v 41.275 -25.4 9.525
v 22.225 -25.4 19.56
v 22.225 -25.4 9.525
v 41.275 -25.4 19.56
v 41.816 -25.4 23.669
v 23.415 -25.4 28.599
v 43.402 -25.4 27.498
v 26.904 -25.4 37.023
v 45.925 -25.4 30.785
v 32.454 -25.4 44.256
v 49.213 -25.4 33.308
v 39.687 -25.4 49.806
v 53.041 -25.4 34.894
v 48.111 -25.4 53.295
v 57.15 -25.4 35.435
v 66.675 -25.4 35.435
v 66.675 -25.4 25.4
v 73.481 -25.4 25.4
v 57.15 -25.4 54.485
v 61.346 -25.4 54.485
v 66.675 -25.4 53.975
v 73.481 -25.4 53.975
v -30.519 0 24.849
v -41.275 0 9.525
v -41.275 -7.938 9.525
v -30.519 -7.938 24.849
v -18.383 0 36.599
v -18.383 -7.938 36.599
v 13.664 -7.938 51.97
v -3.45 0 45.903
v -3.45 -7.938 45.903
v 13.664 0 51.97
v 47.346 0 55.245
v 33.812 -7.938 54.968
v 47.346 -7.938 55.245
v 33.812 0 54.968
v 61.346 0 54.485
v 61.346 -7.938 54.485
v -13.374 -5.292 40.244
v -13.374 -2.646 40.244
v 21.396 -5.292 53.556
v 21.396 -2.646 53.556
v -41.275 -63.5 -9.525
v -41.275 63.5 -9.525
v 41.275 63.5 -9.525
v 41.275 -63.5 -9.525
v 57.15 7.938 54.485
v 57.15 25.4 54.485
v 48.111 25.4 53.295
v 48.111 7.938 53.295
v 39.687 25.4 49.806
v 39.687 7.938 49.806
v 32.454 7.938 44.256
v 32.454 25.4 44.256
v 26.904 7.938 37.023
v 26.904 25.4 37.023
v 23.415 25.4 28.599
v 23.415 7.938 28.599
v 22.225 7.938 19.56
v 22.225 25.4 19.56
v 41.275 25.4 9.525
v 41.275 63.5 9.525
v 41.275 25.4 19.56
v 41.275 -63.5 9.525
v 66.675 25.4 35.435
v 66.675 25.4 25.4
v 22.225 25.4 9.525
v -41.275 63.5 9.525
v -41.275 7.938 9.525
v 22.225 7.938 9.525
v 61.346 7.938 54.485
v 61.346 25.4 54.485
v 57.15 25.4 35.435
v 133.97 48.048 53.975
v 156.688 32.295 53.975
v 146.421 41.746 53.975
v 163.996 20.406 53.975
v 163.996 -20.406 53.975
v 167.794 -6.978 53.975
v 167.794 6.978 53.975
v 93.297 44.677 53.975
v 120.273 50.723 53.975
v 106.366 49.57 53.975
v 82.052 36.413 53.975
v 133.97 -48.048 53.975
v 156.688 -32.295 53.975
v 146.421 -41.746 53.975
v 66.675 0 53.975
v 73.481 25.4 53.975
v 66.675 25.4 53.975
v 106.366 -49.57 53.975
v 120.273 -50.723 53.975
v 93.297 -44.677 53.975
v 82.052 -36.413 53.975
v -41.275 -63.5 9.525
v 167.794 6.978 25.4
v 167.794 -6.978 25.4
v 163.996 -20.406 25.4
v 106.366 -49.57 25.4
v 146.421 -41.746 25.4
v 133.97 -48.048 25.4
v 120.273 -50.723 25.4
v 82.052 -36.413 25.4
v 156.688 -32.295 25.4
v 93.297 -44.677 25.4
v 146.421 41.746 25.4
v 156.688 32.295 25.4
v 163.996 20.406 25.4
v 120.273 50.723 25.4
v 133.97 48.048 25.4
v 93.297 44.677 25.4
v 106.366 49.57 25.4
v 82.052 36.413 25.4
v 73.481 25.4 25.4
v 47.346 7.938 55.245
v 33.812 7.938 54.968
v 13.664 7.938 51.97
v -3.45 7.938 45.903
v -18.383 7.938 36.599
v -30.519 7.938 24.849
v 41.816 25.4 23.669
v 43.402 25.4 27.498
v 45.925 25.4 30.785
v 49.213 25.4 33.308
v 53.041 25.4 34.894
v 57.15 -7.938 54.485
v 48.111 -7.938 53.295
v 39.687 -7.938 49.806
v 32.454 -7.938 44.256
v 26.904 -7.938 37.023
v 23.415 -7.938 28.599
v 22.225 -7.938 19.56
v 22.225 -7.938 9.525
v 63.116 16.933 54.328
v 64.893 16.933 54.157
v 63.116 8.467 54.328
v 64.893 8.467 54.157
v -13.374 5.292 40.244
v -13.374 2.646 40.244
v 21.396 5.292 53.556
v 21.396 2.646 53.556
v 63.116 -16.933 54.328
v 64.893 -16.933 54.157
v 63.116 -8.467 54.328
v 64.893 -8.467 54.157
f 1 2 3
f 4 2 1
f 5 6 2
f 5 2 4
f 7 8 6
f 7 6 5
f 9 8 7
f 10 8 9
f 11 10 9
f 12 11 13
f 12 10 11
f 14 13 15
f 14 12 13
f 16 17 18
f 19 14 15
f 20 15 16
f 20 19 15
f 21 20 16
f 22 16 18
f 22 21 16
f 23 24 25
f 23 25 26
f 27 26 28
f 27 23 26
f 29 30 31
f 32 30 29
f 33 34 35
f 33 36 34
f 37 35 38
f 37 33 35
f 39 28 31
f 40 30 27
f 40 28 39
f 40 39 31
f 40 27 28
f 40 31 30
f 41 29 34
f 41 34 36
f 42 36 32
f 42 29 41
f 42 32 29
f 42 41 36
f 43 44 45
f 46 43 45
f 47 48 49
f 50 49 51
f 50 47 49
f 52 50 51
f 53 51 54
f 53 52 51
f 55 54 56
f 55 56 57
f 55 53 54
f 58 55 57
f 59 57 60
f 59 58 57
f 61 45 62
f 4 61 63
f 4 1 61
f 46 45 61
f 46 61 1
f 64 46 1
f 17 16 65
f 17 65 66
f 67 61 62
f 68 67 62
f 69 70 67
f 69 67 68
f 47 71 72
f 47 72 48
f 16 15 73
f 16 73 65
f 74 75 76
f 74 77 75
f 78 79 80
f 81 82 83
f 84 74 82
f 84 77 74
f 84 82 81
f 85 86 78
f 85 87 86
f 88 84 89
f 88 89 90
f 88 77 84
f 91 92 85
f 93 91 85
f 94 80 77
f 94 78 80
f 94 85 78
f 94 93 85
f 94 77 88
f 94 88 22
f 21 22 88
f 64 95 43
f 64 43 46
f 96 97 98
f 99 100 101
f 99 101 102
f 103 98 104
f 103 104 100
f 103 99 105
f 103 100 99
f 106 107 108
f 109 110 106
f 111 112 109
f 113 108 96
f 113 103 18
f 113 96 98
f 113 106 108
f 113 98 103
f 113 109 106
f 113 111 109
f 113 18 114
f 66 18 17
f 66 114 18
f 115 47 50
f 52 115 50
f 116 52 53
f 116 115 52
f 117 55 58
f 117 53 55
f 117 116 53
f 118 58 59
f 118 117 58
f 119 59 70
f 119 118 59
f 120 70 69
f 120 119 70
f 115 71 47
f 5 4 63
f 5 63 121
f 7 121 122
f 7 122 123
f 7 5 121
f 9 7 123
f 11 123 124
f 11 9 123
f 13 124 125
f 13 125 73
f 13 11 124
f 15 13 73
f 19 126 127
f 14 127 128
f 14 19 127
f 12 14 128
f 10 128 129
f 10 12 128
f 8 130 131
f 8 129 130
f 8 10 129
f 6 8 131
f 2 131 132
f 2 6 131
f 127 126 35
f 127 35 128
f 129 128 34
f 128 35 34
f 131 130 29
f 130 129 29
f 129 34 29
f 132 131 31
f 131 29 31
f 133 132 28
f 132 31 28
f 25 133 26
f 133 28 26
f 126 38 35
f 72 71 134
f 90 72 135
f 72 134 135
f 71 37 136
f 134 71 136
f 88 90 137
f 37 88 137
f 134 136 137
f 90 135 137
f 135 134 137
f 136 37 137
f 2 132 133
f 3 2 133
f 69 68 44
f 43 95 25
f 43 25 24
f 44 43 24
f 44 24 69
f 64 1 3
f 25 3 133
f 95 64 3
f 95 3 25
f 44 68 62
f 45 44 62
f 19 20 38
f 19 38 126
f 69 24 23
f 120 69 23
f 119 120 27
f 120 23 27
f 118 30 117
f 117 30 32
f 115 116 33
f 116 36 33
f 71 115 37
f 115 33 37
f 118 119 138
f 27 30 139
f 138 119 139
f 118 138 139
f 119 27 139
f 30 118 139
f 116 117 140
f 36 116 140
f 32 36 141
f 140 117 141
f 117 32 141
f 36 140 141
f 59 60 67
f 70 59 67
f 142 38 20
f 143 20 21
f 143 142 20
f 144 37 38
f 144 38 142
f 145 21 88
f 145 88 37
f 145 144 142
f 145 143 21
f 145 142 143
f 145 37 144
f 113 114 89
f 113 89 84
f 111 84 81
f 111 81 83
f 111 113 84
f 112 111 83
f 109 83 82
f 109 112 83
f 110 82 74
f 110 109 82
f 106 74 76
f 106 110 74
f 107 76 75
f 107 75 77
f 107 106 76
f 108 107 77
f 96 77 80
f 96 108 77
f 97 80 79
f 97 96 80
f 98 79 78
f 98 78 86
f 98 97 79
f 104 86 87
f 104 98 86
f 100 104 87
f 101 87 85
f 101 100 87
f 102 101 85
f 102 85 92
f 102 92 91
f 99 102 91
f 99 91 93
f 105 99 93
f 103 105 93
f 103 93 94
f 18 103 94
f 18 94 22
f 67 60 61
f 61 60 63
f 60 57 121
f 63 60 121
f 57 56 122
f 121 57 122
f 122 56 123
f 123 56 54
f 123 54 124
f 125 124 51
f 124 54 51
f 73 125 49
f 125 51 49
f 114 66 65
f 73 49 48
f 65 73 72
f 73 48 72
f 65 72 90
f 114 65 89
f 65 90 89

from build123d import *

# Parameters (mm, degrees)
F1_DEPTH = 63.5
F2_DEPTH = 7.9375
F3_DEPTH = 25.4


with BuildPart() as f1:
    # F0 (on Front) → F1 (new body, symmetric)
    with BuildSketch(Plane.XZ):
        Polygon((22.225, 9.525), (-41.275, 9.525), (-41.275, -9.525), (41.275, -9.525), (41.275, 9.525), align=None)
    extrude(amount=F1_DEPTH, both=True)

    # F0 (on Front) → F2 (join, symmetric)
    with BuildSketch(Plane.XZ):
        with BuildLine():
            add(Edge.make_bspline(
                [(-41.275, 9.525), (-17.372467, 50.623456), (19.370141, 58.072404), (61.345564, 54.485139)],
                knots=[0, 0, 0, 0, 112.026415, 112.026415, 112.026415, 112.026415], degree=3))
            Line((-41.275, 9.525), (22.225, 9.525))
            Line((22.225, 9.525), (22.225, 19.560138))
            ThreePointArc((22.225, 19.560138), (32.454295, 44.255843), (57.15, 54.485139))
            Line((57.15, 54.485139), (61.345564, 54.485139))
        make_face()
    extrude(amount=F2_DEPTH, both=True)

    # F0 (on Front) → F3 (join, symmetric)
    with BuildSketch(Plane.XZ):
        with BuildLine():
            Line((22.225, 19.560138), (22.225, 9.525))
            Line((22.225, 9.525), (41.275, 9.525))
            Line((41.275, 9.525), (41.275, 19.560138))
            ThreePointArc((41.275, 19.560138), (45.92468, 30.785458), (57.15, 35.435138))
            Line((57.15, 35.435138), (66.675, 35.435138))
            Line((66.675, 35.435138), (66.675, 53.975))
            add(Edge.make_bspline(
                [(61.345564, 54.485139), (63.112955, 54.334095), (64.889623, 54.163487), (66.675, 53.975)],
                knots=[112.026415, 112.026415, 112.026415, 112.026415, 116.74333, 116.74333, 116.74333, 116.74333], degree=3))
            Line((61.345564, 54.485139), (57.15, 54.485139))
            ThreePointArc((57.15, 54.485139), (32.454295, 44.255843), (22.225, 19.560138))
        make_face()
        Polygon((117.475, 53.975), (66.675, 53.975), (66.675, 35.435138), (66.675, 25.4), (117.475, 25.4), align=None)
    extrude(amount=F3_DEPTH, both=True)

    # F0 (on Front) → F4 (revolve)
    with BuildSketch(Plane.XZ):
        Polygon((117.475, 53.975), (66.675, 53.975), (66.675, 35.435138), (66.675, 25.4), (117.475, 25.4), align=None)
    revolve(axis=Axis((117.475, 0, 39.6875), (0, 0, -1)))


solid = f1.part
